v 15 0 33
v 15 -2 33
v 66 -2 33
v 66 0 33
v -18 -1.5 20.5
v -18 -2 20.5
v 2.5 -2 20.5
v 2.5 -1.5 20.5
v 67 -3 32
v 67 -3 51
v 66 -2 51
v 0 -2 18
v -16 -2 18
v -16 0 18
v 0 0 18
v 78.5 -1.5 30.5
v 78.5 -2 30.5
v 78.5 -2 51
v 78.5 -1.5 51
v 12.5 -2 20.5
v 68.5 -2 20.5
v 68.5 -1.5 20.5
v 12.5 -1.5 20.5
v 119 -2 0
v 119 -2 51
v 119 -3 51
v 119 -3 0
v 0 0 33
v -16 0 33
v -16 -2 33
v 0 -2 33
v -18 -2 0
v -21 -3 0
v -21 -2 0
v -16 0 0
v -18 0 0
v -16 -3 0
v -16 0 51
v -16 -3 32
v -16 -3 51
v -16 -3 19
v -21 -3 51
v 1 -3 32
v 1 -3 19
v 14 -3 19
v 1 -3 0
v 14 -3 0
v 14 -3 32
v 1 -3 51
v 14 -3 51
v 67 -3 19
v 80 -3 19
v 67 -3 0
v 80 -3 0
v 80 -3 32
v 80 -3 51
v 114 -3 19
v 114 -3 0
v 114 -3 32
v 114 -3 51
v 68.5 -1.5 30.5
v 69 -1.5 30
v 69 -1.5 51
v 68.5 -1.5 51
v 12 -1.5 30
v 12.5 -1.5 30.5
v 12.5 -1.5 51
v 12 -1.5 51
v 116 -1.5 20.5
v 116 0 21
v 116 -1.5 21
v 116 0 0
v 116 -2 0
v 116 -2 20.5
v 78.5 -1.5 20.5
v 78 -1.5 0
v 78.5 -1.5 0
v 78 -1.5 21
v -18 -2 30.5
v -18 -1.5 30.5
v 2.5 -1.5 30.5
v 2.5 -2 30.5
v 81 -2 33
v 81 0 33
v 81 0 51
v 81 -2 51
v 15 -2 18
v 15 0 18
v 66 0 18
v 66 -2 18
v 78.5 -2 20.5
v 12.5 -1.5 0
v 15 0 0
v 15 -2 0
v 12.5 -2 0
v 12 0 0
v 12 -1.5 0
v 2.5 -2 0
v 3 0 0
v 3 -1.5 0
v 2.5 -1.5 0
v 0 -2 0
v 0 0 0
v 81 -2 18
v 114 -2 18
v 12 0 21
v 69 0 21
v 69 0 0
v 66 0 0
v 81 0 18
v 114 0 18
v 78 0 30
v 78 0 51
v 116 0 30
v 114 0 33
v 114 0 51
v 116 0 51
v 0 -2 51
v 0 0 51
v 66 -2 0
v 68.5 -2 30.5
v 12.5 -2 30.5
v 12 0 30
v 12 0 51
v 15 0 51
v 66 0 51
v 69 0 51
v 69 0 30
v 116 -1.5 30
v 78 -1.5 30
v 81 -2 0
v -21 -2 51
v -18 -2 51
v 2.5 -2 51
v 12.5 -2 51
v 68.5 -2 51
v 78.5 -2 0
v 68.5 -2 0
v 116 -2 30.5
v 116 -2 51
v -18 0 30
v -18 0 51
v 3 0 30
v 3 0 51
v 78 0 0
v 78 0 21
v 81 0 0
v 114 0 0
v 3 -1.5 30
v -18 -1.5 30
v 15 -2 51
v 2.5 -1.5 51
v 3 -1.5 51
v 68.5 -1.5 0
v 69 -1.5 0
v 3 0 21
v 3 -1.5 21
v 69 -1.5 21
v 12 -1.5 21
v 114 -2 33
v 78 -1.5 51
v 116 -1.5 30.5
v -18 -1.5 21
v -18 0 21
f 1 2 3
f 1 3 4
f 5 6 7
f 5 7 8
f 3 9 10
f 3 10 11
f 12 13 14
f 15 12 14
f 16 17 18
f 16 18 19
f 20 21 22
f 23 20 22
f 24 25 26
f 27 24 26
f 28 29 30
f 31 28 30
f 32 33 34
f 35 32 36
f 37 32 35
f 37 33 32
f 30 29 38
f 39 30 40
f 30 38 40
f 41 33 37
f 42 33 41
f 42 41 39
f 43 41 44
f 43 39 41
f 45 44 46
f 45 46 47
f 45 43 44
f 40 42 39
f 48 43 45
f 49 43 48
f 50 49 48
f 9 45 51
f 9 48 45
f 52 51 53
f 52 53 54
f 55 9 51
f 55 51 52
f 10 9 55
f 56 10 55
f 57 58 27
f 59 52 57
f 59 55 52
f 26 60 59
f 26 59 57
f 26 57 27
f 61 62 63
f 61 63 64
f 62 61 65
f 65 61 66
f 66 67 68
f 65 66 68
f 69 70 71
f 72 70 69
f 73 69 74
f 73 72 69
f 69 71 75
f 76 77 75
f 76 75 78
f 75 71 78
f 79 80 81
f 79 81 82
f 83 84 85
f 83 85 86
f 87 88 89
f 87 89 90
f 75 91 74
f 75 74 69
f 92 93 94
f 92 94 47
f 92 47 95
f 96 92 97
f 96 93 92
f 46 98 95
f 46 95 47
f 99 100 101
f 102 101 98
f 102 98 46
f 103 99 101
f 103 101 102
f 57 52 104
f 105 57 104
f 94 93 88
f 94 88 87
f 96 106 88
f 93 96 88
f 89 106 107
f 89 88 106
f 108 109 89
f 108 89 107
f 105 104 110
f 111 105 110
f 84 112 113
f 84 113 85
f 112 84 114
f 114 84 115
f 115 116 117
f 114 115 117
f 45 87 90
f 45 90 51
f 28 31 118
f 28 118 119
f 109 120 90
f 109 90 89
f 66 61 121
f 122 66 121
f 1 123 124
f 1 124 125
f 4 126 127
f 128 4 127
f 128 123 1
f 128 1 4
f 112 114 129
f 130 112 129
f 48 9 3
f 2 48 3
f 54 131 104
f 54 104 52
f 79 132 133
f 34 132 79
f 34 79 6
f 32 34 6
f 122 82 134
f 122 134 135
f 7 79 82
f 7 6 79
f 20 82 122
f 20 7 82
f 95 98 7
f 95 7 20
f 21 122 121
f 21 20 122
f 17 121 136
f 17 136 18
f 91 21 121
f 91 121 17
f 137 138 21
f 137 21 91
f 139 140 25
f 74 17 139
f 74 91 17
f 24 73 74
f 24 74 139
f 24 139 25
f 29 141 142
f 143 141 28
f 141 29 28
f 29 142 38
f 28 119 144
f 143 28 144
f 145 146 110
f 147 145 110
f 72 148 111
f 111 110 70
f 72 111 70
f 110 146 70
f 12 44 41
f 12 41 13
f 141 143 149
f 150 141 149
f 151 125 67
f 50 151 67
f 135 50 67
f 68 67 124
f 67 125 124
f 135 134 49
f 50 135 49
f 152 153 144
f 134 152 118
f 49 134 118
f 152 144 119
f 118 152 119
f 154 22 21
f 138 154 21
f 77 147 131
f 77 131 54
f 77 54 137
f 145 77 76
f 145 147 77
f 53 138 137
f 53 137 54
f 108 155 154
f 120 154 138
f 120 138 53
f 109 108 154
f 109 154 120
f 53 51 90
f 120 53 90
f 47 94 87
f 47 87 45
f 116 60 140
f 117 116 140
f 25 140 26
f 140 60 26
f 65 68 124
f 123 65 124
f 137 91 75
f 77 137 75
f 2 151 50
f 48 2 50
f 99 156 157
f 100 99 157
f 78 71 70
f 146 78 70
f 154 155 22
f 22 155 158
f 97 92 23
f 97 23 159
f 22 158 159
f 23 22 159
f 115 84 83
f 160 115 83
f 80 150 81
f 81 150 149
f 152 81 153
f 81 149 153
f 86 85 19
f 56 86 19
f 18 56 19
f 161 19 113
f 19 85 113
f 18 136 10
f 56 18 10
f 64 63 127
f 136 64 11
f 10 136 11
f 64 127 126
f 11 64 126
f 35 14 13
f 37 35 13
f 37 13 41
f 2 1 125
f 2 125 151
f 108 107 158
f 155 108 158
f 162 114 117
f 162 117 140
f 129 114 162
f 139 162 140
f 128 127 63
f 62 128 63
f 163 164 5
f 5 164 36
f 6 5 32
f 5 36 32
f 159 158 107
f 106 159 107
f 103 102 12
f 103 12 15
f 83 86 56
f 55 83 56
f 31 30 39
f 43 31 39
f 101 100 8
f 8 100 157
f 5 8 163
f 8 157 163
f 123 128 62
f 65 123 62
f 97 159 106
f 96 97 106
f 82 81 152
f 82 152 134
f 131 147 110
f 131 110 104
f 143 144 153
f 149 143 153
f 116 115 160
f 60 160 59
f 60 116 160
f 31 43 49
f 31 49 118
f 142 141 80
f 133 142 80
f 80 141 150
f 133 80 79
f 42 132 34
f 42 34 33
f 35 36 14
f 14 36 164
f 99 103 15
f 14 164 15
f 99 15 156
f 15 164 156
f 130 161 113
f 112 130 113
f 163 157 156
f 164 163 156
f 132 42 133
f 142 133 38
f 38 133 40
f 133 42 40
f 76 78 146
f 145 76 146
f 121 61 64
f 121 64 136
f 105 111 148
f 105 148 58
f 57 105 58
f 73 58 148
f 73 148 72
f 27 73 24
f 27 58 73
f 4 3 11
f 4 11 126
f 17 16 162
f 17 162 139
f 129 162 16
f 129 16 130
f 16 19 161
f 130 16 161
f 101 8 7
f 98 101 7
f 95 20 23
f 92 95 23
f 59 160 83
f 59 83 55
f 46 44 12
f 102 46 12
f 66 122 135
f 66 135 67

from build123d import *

# Parameters (mm, degrees)
PAD_DEPTH       = 51
PAD001_DEPTH    = 53
PAD002_DEPTH    = 51
POCKET_DEPTH    = 51
POCKET001_DEPTH = 51
PAD003_DEPTH    = 39
PAD004_DEPTH    = 22
SKETCH009_W     = 5
SKETCH009_H     = 3
PAD005_DEPTH    = 51
SKETCH010_W     = 3
SKETCH010_H     = 2
POCKET002_DEPTH = 51
SKETCH011_W     = 5
SKETCH011_H     = 3
PAD006_DEPTH    = 51
SKETCH012_W     = 3
SKETCH012_H     = 2
POCKET003_DEPTH = 51
POCKET004_DEPTH = 140


with BuildPart() as part:
    # Sketch → Pad (new body)
    with BuildSketch(Plane.XY):
        Polygon((1, -3), (0, -2), (0, 0), (15, 0), (15, -2), (14, -3), align=None)
    extrude(amount=PAD_DEPTH)

    # Sketch001 (on Face4 of Pad) → Pad001 (join)
    with BuildSketch(Plane.YZ.offset(14)):
        Polygon((0, 33), (0, 18), (-2, 18), (-3, 19), (-3, 32), (-2, 33), align=None)
    extrude(amount=PAD001_DEPTH)

    # Sketch002 (on Face17 of Pad001) → Pad002 (join)
    with BuildSketch(Plane.XY):
        Polygon((66, 0), (81, 0), (81, -2), (80, -3), (67, -3), (66, -2), align=None)
    extrude(amount=PAD002_DEPTH)

    # Sketch003 (on Face5 of Pad002) → Pocket (cut)
    with BuildSketch(Plane.XY.offset(51)):
        Polygon((3, 0), (3, -1.5), (2.5, -1.5), (2.5, -2), (12.5, -2), (12.5, -1.5), (12, -1.5), (12, 0), align=None)
    extrude(amount=-POCKET_DEPTH, mode=Mode.SUBTRACT)

    # Sketch004 (on Face30 of Pocket) → Pocket001 (cut)
    with BuildSketch(Plane.XY.offset(51)):
        Polygon((78, 0), (69, 0), (69, -1.5), (68.5, -1.5), (68.5, -2), (78.5, -2), (78.5, -1.5), (78, -1.5), align=None)
    extrude(amount=-POCKET001_DEPTH, mode=Mode.SUBTRACT)

    # Sketch006 → Pad003 (join)
    with BuildSketch(Plane.YZ.offset(80)):
        Polygon((0, 33), (-2, 33), (-3, 32), (-3, 19), (-2, 18), (0, 18), align=None)
    extrude(amount=PAD003_DEPTH)

    # Sketch007 (on Face3 of Pad003) → Pad004 (join)
    with BuildSketch(Plane(origin=(1, 0, 0), x_dir=(0, -1, 0), z_dir=(-1, 0, 0))):
        Polygon((0, 33), (2, 33), (3, 32), (3, 19), (2, 18), (0, 18), align=None)
    extrude(amount=PAD004_DEPTH)

    # Sketch009 (on Face61 of Pad004) → Pad005 (join)
    with BuildSketch(Plane(origin=(0, 0, 51), x_dir=(1, 0, 0), z_dir=(0, 0, -1))):
        with Locations((116.5, 1.5)):
            Rectangle(SKETCH009_W, SKETCH009_H)
    extrude(amount=PAD005_DEPTH)

    # Sketch010 (on Face70 of Pad005) → Pocket002 (cut)
    with BuildSketch(Plane(origin=(0, 0, 0), x_dir=(1, 0, 0), z_dir=(0, 0, -1))):
        with Locations((117.5, 1)):
            Rectangle(SKETCH010_W, SKETCH010_H)
    extrude(amount=-POCKET002_DEPTH, mode=Mode.SUBTRACT)

    # Sketch011 (on Face17 of Pocket002) → Pad006 (join)
    with BuildSketch(Plane(origin=(0, 0, 51), x_dir=(1, 0, 0), z_dir=(0, 0, -1))):
        with Locations((-18.5, 1.5)):
            Rectangle(SKETCH011_W, SKETCH011_H)
    extrude(amount=PAD006_DEPTH)

    # Sketch012 (on Face32 of Pad006) → Pocket003 (cut)
    with BuildSketch(Plane(origin=(0, 0, 0), x_dir=(1, 0, 0), z_dir=(0, 0, -1))):
        with Locations((-19.5, 1)):
            Rectangle(SKETCH012_W, SKETCH012_H)
    extrude(amount=-POCKET003_DEPTH, mode=Mode.SUBTRACT)

    # Sketch008 (on Face51 of Pad004) → Pocket004 (cut)
    with BuildSketch(Plane.YZ.offset(119)):
        Polygon((0, 30), (-1.5, 30), (-1.5, 30.5), (-2, 30.5), (-2, 20.5), (-1.5, 20.5), (-1.5, 21), (0, 21), align=None)
    extrude(amount=-POCKET004_DEPTH, mode=Mode.SUBTRACT)


solid = part.part
